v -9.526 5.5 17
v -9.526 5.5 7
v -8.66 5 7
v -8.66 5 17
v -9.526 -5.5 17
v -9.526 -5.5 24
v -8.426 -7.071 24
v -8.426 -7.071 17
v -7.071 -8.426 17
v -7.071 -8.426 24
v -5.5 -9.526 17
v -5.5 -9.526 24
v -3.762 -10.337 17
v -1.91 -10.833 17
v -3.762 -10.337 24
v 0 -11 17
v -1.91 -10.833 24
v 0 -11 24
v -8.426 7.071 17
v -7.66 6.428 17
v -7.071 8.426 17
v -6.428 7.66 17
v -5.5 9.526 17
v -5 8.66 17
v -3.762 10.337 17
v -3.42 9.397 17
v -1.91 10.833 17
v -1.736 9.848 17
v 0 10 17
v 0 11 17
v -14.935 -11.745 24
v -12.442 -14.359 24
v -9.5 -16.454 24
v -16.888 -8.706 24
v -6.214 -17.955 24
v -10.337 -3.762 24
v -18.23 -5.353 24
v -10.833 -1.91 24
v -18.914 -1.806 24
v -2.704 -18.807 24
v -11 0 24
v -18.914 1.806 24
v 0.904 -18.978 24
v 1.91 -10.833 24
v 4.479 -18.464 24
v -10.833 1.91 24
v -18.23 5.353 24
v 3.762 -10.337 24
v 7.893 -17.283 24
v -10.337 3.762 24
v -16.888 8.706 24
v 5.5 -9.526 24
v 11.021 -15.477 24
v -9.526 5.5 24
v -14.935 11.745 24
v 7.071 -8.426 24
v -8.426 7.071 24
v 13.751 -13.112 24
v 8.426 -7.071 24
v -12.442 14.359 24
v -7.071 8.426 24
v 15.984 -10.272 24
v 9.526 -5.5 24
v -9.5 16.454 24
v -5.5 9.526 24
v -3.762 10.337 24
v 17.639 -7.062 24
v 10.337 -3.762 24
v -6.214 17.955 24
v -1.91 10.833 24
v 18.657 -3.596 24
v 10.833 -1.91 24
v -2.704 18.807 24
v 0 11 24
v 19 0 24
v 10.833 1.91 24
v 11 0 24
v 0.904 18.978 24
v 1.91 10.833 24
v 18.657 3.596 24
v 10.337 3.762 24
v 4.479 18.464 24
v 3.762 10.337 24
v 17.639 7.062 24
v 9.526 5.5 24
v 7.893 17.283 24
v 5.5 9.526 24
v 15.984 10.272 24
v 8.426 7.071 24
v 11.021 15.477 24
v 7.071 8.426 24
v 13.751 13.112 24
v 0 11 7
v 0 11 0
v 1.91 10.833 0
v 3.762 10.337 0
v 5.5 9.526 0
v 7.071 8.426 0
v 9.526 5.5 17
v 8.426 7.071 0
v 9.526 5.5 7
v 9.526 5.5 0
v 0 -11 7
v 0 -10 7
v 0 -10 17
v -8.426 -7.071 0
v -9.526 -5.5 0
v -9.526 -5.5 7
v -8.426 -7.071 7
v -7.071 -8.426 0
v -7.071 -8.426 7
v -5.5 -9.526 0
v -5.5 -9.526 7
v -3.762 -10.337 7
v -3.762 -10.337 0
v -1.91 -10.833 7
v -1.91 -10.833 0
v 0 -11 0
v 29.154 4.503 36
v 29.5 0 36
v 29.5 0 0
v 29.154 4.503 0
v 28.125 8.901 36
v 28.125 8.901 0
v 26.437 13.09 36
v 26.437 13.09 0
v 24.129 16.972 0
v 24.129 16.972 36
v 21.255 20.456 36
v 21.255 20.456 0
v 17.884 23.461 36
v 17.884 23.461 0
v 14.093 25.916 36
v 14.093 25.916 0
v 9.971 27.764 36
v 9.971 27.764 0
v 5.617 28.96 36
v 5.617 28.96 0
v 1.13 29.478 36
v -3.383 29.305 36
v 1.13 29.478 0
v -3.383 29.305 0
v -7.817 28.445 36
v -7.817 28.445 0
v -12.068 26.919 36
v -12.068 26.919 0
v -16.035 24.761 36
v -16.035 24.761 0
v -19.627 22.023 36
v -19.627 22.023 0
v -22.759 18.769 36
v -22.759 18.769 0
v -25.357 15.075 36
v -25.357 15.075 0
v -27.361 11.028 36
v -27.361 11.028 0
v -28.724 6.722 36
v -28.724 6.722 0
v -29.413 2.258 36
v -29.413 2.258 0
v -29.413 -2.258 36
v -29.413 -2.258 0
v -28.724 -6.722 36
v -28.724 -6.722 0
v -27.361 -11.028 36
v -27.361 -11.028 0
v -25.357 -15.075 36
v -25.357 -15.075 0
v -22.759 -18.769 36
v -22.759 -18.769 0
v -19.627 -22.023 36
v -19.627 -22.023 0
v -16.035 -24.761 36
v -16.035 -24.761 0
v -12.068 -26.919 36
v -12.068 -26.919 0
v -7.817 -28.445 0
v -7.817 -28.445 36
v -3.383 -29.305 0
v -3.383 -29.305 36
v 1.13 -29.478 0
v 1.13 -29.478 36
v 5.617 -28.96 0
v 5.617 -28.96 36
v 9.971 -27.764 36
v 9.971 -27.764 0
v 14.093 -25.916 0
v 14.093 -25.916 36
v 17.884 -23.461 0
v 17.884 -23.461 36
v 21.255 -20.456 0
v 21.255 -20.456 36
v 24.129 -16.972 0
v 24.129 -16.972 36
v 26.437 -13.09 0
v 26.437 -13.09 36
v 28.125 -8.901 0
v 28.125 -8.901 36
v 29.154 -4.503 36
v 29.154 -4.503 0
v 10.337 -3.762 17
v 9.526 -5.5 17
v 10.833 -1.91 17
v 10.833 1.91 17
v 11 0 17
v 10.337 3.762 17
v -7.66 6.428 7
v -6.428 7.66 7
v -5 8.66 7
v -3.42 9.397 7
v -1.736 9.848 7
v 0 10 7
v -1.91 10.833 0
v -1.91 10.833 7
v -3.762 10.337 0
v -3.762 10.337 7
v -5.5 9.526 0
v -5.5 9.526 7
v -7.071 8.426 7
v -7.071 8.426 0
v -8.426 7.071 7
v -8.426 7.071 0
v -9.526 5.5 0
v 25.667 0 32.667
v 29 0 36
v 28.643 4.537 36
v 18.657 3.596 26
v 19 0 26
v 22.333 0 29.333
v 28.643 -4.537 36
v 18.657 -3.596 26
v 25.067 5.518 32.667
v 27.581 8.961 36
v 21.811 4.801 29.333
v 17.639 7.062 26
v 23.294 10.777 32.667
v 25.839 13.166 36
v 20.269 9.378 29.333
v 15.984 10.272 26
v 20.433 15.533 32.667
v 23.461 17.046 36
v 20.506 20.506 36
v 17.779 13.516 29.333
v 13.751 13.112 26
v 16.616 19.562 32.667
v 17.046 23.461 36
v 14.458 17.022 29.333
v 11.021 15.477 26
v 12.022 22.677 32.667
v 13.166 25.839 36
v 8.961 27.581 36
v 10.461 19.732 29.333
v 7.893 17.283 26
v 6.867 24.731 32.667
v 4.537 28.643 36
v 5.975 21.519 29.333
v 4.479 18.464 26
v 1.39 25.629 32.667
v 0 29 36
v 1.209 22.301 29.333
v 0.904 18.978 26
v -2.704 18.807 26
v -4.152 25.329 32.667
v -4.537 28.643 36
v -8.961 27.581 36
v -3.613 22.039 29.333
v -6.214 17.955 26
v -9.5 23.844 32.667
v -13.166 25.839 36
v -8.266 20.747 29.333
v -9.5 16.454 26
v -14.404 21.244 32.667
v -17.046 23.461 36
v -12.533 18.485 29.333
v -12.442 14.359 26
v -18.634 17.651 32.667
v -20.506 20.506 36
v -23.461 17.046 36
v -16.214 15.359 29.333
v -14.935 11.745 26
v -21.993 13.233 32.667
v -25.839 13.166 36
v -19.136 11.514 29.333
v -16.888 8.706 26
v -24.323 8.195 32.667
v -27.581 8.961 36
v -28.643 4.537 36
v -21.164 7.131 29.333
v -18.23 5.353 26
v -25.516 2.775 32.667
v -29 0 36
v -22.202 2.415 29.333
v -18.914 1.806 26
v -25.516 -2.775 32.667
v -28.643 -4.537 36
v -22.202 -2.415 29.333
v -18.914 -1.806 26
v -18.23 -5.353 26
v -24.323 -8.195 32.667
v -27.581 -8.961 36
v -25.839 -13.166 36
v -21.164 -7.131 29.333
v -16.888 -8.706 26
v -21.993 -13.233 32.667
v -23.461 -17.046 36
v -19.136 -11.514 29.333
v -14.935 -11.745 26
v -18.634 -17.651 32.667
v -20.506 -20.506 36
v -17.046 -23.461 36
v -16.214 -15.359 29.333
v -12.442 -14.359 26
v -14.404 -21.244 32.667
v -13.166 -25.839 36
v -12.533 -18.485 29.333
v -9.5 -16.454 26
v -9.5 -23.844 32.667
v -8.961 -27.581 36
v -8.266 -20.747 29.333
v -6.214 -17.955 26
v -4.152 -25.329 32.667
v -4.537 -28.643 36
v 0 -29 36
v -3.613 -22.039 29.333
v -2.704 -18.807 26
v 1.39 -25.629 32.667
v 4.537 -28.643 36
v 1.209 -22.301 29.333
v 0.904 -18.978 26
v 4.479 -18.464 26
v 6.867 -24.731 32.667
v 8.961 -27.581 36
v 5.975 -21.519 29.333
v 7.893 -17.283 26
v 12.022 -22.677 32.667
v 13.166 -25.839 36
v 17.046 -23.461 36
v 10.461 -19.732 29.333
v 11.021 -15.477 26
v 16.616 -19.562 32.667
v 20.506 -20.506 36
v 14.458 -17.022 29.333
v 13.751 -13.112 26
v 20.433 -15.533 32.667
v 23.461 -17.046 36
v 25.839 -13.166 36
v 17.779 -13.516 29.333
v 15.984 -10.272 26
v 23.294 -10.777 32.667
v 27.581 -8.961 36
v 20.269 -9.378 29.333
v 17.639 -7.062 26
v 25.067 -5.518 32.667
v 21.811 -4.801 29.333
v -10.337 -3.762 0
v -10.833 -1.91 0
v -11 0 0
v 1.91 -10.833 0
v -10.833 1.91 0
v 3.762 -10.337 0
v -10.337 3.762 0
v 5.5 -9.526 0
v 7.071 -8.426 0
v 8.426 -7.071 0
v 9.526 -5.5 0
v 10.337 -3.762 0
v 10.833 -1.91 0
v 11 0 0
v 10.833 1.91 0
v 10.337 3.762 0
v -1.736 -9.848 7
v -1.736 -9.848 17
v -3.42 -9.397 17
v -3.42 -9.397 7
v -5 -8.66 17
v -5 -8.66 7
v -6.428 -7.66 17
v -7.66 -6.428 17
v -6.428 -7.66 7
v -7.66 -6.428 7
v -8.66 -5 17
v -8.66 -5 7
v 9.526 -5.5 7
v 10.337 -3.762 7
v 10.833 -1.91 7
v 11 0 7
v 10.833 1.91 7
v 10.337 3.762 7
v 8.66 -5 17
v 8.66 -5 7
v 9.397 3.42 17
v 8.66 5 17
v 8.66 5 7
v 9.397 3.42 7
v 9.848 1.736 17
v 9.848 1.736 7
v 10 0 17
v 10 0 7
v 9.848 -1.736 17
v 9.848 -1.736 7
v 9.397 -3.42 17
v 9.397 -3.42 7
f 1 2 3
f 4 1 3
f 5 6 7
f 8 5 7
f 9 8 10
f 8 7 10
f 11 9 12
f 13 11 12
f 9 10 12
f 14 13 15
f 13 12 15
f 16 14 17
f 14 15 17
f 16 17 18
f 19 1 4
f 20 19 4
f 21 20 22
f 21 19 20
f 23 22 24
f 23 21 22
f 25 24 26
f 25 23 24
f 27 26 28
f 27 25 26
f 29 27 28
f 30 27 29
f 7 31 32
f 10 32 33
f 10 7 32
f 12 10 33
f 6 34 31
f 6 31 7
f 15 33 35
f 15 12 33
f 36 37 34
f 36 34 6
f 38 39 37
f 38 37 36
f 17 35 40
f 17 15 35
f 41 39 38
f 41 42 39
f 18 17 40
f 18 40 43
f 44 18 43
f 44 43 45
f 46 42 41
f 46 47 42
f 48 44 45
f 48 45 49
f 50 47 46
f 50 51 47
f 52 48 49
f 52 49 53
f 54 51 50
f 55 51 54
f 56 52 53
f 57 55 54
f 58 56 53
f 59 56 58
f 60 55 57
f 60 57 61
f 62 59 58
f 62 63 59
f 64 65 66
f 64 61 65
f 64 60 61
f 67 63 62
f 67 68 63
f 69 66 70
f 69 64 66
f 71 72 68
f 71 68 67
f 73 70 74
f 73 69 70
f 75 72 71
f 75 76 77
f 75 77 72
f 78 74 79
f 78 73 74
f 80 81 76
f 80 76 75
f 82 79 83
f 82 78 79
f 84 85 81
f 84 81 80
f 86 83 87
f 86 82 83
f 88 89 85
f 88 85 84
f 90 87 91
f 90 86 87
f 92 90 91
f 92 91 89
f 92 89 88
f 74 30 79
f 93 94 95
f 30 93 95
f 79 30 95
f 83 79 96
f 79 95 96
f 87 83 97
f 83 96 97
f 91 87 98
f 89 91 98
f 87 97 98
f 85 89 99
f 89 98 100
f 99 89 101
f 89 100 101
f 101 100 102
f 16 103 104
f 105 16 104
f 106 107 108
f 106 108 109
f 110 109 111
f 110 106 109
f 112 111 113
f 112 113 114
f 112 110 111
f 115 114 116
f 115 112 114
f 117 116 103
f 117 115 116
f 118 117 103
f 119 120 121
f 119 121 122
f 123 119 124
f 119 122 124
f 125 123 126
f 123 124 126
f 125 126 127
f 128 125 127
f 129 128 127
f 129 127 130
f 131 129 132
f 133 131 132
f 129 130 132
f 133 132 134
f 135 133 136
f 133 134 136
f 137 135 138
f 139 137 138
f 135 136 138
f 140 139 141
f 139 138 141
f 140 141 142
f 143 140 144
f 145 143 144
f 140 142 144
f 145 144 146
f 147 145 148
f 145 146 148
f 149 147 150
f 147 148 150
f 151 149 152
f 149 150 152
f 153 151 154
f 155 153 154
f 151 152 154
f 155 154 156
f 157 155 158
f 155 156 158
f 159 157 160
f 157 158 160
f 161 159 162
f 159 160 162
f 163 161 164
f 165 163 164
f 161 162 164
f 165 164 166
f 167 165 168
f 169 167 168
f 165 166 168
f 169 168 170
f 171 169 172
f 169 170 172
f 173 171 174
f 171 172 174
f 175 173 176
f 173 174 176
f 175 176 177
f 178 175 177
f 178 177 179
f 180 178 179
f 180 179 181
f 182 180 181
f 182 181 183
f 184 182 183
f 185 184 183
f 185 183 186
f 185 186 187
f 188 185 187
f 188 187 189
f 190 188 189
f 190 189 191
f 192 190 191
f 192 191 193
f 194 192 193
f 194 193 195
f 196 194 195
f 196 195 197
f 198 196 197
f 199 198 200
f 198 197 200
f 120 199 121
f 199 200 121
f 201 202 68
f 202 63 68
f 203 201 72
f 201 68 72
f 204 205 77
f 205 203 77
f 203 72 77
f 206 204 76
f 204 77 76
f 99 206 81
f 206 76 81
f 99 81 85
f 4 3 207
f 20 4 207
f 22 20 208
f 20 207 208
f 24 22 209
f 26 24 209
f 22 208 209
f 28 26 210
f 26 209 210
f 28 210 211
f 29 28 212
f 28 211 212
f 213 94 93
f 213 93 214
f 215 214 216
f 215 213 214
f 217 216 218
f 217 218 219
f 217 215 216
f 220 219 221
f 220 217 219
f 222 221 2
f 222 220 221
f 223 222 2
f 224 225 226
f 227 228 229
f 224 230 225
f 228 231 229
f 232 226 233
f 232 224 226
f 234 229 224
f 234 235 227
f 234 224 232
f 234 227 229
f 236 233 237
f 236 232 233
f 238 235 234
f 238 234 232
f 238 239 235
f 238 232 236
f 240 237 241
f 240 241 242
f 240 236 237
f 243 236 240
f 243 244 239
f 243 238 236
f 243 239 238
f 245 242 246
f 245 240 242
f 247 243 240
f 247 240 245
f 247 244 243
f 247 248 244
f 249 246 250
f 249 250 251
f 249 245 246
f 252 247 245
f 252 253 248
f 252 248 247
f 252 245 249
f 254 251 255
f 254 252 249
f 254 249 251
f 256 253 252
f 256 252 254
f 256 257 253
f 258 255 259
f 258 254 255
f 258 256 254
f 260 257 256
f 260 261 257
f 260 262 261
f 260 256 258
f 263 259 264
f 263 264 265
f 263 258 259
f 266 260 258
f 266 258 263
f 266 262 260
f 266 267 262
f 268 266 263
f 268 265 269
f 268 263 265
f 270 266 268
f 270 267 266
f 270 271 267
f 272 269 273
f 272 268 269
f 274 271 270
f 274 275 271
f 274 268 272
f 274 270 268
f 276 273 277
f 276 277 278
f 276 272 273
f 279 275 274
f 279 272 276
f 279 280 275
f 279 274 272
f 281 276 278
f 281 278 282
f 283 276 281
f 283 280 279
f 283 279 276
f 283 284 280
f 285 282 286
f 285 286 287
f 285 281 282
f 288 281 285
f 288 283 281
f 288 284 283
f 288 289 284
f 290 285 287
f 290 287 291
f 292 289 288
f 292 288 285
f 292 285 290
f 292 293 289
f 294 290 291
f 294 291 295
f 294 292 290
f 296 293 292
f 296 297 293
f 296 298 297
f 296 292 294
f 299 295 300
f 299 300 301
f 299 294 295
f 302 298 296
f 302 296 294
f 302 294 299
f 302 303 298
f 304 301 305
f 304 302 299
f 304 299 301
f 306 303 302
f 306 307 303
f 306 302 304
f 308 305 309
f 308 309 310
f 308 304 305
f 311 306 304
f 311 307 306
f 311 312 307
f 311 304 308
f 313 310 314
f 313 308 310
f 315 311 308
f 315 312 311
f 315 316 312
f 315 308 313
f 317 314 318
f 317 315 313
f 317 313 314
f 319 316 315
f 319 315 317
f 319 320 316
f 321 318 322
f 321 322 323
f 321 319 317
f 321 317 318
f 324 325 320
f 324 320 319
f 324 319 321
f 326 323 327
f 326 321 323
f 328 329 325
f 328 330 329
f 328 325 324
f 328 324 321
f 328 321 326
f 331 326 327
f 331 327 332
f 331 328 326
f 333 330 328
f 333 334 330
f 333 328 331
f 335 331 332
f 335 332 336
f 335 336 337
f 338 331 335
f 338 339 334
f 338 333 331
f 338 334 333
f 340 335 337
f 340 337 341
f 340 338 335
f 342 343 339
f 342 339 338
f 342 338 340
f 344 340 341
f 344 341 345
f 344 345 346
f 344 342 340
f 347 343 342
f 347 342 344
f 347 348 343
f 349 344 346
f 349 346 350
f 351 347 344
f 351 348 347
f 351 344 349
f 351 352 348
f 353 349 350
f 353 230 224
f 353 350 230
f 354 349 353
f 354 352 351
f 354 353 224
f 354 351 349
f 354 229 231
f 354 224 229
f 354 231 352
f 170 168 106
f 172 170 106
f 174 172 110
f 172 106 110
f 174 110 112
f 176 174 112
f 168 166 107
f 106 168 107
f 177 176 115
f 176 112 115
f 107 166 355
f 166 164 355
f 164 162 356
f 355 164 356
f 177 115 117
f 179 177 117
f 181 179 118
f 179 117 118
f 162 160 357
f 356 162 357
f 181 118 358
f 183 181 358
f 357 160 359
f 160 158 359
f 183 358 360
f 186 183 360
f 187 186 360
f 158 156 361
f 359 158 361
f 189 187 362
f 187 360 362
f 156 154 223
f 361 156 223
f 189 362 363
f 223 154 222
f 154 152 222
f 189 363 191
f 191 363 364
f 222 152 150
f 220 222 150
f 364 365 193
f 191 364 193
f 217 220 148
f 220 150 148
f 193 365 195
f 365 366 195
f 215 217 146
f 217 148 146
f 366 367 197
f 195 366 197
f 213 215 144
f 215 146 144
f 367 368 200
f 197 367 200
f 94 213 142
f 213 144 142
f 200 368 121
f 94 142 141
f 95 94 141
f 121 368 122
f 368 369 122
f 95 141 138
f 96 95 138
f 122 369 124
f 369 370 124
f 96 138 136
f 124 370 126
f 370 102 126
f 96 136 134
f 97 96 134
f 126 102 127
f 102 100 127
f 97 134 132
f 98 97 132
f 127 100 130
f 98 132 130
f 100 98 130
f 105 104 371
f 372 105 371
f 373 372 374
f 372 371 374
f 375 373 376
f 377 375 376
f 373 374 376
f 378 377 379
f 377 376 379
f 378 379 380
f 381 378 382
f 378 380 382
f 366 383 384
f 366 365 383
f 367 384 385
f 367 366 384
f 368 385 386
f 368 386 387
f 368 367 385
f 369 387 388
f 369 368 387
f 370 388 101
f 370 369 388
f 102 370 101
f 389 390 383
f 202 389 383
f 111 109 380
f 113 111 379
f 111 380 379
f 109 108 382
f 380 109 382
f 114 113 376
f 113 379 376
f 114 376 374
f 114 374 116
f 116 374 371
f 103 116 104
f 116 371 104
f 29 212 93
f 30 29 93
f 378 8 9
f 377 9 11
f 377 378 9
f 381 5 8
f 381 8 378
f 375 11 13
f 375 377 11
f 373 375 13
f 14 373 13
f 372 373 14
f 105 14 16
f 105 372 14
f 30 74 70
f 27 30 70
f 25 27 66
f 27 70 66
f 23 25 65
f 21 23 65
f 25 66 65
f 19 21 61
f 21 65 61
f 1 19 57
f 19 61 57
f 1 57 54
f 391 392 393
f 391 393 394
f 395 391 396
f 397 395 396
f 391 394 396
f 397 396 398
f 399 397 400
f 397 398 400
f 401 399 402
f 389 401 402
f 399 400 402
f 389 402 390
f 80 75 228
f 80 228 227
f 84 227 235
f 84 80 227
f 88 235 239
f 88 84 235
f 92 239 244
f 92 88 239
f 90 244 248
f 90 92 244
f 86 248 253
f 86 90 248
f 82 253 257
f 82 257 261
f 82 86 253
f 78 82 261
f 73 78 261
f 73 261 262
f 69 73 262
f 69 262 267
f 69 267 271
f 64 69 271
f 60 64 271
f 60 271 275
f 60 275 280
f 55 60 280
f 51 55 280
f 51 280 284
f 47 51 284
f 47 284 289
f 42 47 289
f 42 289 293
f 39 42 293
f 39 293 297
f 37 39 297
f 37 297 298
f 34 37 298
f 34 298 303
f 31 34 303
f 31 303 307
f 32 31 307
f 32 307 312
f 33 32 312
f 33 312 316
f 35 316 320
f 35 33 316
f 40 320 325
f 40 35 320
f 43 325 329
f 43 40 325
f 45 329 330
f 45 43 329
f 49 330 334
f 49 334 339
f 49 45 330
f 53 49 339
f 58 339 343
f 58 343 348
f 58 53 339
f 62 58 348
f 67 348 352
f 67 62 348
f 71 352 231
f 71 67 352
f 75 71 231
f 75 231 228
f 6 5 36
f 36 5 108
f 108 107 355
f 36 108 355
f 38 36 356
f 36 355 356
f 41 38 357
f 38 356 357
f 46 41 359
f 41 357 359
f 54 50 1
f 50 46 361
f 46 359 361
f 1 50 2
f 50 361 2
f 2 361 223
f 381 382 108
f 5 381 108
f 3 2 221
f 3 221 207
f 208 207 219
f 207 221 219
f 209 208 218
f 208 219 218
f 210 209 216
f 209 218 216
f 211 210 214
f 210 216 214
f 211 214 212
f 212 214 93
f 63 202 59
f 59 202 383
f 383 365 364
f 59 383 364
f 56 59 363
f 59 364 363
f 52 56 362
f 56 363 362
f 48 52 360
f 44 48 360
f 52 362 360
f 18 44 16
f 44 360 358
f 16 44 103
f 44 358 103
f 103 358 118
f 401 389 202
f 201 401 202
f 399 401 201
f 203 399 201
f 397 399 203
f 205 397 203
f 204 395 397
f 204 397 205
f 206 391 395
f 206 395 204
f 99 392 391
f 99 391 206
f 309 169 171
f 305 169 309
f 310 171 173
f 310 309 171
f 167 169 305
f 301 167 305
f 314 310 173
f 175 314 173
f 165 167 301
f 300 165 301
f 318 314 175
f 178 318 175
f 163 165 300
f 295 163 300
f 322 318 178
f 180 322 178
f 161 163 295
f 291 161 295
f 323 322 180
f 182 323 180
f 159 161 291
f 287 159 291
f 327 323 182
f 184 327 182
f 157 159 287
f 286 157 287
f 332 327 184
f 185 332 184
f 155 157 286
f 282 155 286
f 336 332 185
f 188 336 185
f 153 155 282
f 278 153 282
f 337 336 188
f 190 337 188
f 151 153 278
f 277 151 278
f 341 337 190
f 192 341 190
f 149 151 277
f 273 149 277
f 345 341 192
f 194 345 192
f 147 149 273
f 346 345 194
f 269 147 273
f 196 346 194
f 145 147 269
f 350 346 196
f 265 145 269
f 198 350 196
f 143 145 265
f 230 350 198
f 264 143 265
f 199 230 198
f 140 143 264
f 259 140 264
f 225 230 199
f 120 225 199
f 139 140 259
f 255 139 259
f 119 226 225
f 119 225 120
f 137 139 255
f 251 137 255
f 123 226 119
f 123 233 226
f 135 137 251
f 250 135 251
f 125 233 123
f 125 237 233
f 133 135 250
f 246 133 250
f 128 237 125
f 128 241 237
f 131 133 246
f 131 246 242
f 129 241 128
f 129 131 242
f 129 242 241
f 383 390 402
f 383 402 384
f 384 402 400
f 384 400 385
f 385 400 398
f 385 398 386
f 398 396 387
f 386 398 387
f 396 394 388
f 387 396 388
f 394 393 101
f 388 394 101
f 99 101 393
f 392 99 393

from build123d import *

# Parameters (mm, degrees)
F0_R     = 19
F1_DEPTH = 24
F2_R     = 11
F3_DEPTH = 7
F4_R     = 11
F5_DEPTH = 7
F6_R     = 29.5
F6_R_2   = 19
F7_DEPTH = 36
F8_SIZE  = 10


with BuildPart() as f1:
    # F0 (on Top) → F1 (new body)
    with BuildSketch(Plane.XY):
        Circle(F0_R)
        with BuildLine():
            ThreePointArc((-9.5262794416, 5.5), (-5.5, 9.5262794416), (0, 11))
            ThreePointArc((0, 11), (5.5, 9.5262794416), (9.5262794416, 5.5))
            ThreePointArc((9.5262794416, 5.5), (10.6251840892, 2.8470094961), (11, 0))
            ThreePointArc((11, 0), (10.6251840892, -2.8470094961), (9.5262794416, -5.5))
            ThreePointArc((9.5262794416, -5.5), (5.5, -9.5262794416), (0, -11))
            ThreePointArc((0, -11), (-5.5, -9.5262794416), (-9.5262794416, -5.5))
            ThreePointArc((-9.5262794416, -5.5), (-11, 0), (-9.5262794416, 5.5))
        make_face(mode=Mode.SUBTRACT)
        with BuildLine():
            ThreePointArc((11, 0), (10.6251840892, 2.8470094961), (9.5262794416, 5.5))
            Line((9.5262794416, 5.5), (8.6602540378, 5))
            ThreePointArc((8.6602540378, 5), (10, 0), (8.6602540378, -5))
            Line((8.6602540378, -5), (9.5262794416, -5.5))
            ThreePointArc((9.5262794416, -5.5), (10.6251840892, -2.8470094961), (11, 0))
        make_face()
        with BuildLine():
            ThreePointArc((-8.6602540378, 5), (-5, 8.6602540378), (0, 10))
            Line((0, 10), (0, 11))
            ThreePointArc((0, 11), (-5.5, 9.5262794416), (-9.5262794416, 5.5))
            Line((-9.5262794416, 5.5), (-8.6602540378, 5))
        make_face()
        with BuildLine():
            Line((-8.6602540378, -5), (-9.5262794416, -5.5))
            ThreePointArc((-9.5262794416, -5.5), (-5.5, -9.5262794416), (0, -11))
            Line((0, -11), (0, -10))
            ThreePointArc((0, -10), (-5, -8.6602540378), (-8.6602540378, -5))
        make_face()
    extrude(amount=F1_DEPTH)

    # F2 (on Top) → F3 (cut)
    with BuildSketch(Plane.XY):
        Circle(F2_R)
    extrude(amount=F3_DEPTH, mode=Mode.SUBTRACT)

    # F4 (on face) → F5 (cut)
    with BuildSketch(Plane.XY.offset(24)):
        Circle(F4_R)
    extrude(amount=-F5_DEPTH, mode=Mode.SUBTRACT)

    # F6 (on Top) → F7 (join)
    with BuildSketch(Plane.XY):
        Circle(F6_R)
        Circle(F6_R_2, mode=Mode.SUBTRACT)
    extrude(amount=F7_DEPTH)

    # F8
    f8_edges = [f1.edges().sort_by_distance(p)[0] for p in [
        (-19, 0, 36),
    ]]
    chamfer(f8_edges, length=F8_SIZE)


solid = f1.part
